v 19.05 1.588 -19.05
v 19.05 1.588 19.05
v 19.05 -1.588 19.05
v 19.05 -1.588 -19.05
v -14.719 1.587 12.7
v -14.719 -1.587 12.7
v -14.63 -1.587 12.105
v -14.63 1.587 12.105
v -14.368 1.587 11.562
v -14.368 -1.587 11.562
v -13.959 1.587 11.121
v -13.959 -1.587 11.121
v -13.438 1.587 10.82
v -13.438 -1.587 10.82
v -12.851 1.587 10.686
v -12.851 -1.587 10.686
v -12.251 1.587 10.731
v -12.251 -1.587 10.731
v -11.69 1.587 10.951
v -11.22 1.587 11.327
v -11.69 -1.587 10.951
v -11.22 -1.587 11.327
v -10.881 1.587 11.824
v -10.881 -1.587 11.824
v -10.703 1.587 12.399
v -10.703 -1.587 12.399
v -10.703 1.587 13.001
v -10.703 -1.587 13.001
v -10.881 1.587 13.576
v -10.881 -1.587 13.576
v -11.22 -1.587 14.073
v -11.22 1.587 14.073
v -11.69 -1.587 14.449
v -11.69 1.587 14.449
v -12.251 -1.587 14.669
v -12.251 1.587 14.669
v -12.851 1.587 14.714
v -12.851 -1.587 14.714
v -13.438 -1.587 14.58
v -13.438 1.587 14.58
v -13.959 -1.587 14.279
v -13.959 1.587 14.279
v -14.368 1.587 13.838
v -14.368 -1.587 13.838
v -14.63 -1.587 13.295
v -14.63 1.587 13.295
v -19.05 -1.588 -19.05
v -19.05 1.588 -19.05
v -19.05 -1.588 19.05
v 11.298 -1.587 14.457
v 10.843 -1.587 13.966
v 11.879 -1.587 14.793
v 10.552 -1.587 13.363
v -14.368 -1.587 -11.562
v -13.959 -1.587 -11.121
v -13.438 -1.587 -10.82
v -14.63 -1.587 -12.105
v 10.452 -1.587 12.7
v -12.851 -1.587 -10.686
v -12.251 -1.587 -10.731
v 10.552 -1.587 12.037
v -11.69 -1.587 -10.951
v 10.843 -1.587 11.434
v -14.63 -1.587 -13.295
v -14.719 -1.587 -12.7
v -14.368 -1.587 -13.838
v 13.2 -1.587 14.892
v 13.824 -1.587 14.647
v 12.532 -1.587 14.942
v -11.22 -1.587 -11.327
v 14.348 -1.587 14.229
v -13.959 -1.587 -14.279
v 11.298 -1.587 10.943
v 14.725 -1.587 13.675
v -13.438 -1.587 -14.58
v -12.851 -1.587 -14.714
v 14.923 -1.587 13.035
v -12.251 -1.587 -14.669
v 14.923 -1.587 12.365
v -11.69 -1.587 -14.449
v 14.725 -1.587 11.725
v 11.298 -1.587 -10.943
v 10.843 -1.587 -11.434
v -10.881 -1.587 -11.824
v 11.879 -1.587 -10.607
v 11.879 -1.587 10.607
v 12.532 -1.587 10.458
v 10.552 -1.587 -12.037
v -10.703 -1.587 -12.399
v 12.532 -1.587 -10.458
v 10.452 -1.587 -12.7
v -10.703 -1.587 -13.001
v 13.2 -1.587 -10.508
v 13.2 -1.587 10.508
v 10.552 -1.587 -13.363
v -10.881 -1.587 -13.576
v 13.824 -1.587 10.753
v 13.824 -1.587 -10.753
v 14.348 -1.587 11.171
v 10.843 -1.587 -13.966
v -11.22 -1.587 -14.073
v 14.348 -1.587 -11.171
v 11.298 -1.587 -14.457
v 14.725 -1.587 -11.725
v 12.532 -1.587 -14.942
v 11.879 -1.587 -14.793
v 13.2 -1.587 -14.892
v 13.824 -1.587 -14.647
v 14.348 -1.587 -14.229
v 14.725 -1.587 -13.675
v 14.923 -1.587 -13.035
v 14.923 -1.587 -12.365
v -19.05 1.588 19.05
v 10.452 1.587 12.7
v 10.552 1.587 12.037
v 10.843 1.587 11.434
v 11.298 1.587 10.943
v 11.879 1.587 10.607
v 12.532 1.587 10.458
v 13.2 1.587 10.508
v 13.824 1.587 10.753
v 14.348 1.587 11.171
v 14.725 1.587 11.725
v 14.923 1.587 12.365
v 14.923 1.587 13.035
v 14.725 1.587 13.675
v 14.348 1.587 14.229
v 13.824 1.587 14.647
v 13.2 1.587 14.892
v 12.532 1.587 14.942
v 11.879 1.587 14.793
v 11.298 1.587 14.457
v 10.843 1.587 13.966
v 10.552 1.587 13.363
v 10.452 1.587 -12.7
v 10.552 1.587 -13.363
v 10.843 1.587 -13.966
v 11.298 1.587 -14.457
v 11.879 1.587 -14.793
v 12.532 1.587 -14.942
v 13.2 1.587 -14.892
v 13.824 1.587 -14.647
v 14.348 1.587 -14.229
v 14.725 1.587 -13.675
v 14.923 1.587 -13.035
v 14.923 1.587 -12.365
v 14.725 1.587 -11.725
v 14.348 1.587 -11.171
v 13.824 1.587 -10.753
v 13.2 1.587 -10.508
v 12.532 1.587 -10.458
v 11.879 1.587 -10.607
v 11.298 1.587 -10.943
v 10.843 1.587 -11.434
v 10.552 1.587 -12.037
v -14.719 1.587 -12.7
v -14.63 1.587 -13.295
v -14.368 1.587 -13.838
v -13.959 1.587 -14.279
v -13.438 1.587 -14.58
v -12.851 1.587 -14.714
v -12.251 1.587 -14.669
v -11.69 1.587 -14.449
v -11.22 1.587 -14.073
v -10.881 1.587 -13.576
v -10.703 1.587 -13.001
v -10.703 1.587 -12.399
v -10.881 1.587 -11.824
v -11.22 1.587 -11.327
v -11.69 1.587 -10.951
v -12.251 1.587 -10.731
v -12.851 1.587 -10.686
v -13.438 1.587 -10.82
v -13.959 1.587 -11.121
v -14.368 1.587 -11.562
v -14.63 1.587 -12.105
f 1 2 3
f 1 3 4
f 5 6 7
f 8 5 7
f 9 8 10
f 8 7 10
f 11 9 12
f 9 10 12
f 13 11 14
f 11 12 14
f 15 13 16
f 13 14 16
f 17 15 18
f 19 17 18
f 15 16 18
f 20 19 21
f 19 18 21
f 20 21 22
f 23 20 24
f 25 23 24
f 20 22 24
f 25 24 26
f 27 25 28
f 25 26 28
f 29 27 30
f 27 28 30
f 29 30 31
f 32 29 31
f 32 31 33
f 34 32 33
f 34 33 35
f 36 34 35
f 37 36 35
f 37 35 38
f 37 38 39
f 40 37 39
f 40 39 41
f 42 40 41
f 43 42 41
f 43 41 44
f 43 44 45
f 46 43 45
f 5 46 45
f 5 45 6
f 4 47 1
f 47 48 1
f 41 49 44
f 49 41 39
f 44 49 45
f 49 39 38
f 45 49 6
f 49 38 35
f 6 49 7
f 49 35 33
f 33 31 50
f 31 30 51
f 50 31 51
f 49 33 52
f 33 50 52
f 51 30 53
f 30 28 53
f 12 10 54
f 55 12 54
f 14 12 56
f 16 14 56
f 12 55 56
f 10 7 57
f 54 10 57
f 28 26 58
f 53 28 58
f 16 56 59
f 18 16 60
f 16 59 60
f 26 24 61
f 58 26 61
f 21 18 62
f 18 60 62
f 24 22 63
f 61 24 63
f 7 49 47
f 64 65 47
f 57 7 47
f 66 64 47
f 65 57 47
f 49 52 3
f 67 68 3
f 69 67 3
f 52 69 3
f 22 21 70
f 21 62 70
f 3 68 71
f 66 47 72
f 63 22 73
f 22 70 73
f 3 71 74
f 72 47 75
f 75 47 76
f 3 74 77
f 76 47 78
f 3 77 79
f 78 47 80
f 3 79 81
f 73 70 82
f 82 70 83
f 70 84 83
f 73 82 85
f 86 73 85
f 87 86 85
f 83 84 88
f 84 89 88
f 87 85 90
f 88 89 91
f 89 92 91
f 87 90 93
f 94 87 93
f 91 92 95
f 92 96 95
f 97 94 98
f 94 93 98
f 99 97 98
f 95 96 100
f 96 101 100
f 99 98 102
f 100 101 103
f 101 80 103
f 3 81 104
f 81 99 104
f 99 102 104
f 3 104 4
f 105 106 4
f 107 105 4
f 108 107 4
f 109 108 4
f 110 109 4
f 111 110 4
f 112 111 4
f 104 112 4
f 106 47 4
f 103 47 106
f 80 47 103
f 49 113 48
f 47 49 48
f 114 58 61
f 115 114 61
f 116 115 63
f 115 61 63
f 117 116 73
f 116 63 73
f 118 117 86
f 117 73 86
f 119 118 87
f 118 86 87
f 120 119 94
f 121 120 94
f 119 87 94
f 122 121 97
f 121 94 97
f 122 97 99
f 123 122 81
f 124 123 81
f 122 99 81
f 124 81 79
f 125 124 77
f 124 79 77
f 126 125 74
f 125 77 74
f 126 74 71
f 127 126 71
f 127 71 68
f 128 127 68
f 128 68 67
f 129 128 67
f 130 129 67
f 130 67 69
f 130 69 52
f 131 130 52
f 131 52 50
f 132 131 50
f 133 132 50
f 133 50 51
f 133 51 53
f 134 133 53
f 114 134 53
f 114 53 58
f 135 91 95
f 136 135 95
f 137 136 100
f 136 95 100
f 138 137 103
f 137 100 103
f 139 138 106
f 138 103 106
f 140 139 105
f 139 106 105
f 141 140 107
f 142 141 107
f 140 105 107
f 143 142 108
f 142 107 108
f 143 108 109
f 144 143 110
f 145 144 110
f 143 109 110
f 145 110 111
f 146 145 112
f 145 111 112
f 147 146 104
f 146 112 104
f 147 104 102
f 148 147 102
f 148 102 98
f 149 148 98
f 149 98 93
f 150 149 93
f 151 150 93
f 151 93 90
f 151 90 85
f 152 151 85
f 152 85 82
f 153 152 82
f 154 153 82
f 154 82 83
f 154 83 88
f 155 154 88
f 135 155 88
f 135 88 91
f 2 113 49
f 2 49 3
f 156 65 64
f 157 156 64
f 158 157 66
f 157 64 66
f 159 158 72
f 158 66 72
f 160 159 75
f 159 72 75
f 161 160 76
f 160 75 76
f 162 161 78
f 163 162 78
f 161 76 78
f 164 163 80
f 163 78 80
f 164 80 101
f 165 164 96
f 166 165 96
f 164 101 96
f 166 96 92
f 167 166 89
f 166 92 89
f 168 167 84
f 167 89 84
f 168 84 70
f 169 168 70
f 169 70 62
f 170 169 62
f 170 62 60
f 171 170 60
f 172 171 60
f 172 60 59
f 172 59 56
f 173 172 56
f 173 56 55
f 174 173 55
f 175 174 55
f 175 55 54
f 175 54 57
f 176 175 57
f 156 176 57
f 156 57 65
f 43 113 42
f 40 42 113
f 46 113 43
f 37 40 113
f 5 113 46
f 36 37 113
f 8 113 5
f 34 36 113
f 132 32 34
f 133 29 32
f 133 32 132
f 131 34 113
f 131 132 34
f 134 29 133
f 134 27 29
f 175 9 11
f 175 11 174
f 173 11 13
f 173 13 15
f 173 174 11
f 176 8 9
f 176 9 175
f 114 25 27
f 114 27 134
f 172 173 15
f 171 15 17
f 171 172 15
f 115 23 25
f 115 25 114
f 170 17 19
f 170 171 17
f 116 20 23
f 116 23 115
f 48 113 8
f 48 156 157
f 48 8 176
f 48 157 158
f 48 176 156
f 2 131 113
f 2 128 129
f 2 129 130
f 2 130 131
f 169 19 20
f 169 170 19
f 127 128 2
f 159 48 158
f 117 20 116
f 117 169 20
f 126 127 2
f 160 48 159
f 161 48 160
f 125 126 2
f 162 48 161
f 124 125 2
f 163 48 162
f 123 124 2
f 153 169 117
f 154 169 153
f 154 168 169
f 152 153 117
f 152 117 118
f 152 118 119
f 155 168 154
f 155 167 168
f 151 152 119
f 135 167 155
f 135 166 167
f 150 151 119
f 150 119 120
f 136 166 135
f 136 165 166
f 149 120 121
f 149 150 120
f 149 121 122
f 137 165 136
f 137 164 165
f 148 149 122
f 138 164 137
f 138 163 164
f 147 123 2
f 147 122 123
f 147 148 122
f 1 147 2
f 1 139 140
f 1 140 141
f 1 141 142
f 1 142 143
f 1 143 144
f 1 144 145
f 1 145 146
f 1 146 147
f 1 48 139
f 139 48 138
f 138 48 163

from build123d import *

# Parameters (mm, degrees)
SKETCH1_W              = 38.1
SKETCH1_H              = 38.1
BOSS_EXTRUDE1_DEPTH    = 1.5875
F_10_32_TAPPED_HOLE1_D = 4.0386
F_8_CLEARANCE_HOLE1_D  = 4.4958


with BuildPart() as part:
    # Sketch1 → Boss-Extrude1 (new, symmetric)
    with BuildSketch(Plane(origin=(0, 0, 0), x_dir=(1, 0, 0), z_dir=(0, 1, 0))):
        Rectangle(SKETCH1_W, SKETCH1_H)
    extrude(amount=BOSS_EXTRUDE1_DEPTH, both=True)

    # #10-32 Tapped Hole1 (through all)
    with Locations(Plane(origin=(0, 1.5875, 0), x_dir=(1, 0, 0), z_dir=(0, 1, 0))):
        with Locations((-12.7, 12.7), (-12.7, -12.7)):
            Hole(F_10_32_TAPPED_HOLE1_D / 2)

    # #8 Clearance Hole1 (through all)
    with Locations(Plane(origin=(0, 1.5875, 0), x_dir=(1, 0, 0), z_dir=(0, 1, 0))):
        with Locations((12.7, 12.7), (12.7, -12.7)):
            Hole(F_8_CLEARANCE_HOLE1_D / 2)


solid = part.part
